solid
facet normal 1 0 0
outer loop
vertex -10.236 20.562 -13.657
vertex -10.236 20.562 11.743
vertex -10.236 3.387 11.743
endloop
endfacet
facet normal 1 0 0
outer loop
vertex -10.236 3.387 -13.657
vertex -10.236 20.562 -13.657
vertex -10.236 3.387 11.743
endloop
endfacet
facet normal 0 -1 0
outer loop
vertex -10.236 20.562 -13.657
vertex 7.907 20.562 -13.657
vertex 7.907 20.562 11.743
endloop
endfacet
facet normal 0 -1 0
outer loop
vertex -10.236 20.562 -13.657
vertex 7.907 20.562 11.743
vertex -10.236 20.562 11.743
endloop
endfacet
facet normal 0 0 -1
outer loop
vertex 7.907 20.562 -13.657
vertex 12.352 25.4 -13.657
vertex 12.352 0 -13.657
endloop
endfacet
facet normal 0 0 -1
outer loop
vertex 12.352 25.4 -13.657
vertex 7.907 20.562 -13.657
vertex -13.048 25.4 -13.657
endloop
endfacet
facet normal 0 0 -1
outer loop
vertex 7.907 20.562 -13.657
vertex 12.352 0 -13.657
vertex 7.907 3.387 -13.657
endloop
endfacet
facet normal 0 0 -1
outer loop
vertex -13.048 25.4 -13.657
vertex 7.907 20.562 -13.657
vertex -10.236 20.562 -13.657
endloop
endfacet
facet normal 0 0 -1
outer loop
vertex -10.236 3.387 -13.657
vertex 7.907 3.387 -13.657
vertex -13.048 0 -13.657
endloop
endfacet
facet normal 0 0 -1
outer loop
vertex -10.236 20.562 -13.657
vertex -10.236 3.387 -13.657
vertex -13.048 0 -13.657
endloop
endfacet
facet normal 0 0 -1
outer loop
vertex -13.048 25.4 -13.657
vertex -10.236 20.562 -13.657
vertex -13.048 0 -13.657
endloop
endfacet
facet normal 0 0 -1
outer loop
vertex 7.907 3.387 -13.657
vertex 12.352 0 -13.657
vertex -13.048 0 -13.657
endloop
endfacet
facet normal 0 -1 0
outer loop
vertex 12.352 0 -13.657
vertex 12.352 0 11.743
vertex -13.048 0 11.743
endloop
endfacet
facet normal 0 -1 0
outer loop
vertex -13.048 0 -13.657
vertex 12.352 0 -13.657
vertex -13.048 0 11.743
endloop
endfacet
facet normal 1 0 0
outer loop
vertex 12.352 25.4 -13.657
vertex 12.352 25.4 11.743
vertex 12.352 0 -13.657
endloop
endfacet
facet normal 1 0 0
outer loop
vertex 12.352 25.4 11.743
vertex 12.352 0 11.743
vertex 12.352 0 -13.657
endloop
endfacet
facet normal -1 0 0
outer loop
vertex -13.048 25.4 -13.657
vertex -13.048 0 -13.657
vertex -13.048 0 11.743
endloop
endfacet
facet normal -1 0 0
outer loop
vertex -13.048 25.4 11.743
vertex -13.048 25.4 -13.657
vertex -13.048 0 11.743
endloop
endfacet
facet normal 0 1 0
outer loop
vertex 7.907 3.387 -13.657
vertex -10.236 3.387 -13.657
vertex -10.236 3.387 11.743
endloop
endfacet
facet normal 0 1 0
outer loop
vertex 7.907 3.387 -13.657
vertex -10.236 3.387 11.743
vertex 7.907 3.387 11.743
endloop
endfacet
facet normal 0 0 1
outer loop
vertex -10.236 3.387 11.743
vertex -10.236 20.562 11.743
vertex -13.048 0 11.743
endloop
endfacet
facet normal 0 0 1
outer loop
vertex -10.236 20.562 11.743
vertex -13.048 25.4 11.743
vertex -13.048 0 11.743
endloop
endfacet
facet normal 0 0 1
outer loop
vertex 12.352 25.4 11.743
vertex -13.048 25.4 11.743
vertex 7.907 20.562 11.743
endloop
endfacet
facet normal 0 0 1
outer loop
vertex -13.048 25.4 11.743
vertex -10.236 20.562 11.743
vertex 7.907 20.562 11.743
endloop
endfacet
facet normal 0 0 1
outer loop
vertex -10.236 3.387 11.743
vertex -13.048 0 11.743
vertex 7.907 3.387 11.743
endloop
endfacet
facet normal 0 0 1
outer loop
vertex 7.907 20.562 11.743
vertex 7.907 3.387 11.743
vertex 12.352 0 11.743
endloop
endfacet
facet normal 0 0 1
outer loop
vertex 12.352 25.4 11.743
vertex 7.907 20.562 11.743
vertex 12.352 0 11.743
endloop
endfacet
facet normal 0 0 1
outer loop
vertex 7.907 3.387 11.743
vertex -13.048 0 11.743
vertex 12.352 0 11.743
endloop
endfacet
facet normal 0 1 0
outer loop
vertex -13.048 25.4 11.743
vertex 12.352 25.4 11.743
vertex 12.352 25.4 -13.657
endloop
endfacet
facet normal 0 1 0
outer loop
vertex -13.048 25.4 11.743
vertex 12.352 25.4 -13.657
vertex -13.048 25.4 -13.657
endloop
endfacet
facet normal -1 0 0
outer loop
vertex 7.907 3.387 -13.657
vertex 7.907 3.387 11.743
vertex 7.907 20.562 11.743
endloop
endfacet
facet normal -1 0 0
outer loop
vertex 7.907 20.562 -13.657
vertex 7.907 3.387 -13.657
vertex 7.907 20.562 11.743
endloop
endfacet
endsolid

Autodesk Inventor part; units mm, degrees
ref_plane "YZ Plane" through (0, 0, 0) normal (1, 0, 0) x (0, 1, 0)
ref_plane "XZ Plane" through (0, 0, 0) normal (0, 1, 0) x (-1, 0, 0)
ref_plane "XY Plane" through (0, 0, 0) normal (0, 0, 1) x (1, 0, 0)
sketch "Sketch1" plane through (0, 0, 0) normal (0, 1, 0) x (-1, 0, 0)
  line L0 (13.0479, 11.7432) -> (-12.3521, 11.7432)
  line L1 (-12.3521, 11.7432) -> (-12.3521, -13.6568)
  line L2 (-12.3521, -13.6568) -> (13.0479, -13.6568)
  line L3 (13.0479, -13.6568) -> (13.0479, 11.7432)
  point P0 (0, 0)
  dimension "d0" = 25.4
  dimension "d1" = 25.4
extrude "Extrusion1" add sketch "Sketch1" along normal blind 25.4
sketch "Sketch2" plane through (-13.0479, 0, 11.7432) normal (0, 0, 1) x (1, 0, 0)
  line L0 (2.8121, 3.3867) -> (20.955, 3.3867)
  line L1 (20.955, 3.3867) -> (20.955, 20.5619)
  line L2 (20.955, 20.5619) -> (2.8121, 20.5619)
  line L3 (2.8121, 20.5619) -> (2.8121, 3.3867)
  point P0 (13.0479, 0)
extrude "Extrusion2" cut sketch "Sketch2" against normal blind 25.4
properties part number "Zohair did a thing"
